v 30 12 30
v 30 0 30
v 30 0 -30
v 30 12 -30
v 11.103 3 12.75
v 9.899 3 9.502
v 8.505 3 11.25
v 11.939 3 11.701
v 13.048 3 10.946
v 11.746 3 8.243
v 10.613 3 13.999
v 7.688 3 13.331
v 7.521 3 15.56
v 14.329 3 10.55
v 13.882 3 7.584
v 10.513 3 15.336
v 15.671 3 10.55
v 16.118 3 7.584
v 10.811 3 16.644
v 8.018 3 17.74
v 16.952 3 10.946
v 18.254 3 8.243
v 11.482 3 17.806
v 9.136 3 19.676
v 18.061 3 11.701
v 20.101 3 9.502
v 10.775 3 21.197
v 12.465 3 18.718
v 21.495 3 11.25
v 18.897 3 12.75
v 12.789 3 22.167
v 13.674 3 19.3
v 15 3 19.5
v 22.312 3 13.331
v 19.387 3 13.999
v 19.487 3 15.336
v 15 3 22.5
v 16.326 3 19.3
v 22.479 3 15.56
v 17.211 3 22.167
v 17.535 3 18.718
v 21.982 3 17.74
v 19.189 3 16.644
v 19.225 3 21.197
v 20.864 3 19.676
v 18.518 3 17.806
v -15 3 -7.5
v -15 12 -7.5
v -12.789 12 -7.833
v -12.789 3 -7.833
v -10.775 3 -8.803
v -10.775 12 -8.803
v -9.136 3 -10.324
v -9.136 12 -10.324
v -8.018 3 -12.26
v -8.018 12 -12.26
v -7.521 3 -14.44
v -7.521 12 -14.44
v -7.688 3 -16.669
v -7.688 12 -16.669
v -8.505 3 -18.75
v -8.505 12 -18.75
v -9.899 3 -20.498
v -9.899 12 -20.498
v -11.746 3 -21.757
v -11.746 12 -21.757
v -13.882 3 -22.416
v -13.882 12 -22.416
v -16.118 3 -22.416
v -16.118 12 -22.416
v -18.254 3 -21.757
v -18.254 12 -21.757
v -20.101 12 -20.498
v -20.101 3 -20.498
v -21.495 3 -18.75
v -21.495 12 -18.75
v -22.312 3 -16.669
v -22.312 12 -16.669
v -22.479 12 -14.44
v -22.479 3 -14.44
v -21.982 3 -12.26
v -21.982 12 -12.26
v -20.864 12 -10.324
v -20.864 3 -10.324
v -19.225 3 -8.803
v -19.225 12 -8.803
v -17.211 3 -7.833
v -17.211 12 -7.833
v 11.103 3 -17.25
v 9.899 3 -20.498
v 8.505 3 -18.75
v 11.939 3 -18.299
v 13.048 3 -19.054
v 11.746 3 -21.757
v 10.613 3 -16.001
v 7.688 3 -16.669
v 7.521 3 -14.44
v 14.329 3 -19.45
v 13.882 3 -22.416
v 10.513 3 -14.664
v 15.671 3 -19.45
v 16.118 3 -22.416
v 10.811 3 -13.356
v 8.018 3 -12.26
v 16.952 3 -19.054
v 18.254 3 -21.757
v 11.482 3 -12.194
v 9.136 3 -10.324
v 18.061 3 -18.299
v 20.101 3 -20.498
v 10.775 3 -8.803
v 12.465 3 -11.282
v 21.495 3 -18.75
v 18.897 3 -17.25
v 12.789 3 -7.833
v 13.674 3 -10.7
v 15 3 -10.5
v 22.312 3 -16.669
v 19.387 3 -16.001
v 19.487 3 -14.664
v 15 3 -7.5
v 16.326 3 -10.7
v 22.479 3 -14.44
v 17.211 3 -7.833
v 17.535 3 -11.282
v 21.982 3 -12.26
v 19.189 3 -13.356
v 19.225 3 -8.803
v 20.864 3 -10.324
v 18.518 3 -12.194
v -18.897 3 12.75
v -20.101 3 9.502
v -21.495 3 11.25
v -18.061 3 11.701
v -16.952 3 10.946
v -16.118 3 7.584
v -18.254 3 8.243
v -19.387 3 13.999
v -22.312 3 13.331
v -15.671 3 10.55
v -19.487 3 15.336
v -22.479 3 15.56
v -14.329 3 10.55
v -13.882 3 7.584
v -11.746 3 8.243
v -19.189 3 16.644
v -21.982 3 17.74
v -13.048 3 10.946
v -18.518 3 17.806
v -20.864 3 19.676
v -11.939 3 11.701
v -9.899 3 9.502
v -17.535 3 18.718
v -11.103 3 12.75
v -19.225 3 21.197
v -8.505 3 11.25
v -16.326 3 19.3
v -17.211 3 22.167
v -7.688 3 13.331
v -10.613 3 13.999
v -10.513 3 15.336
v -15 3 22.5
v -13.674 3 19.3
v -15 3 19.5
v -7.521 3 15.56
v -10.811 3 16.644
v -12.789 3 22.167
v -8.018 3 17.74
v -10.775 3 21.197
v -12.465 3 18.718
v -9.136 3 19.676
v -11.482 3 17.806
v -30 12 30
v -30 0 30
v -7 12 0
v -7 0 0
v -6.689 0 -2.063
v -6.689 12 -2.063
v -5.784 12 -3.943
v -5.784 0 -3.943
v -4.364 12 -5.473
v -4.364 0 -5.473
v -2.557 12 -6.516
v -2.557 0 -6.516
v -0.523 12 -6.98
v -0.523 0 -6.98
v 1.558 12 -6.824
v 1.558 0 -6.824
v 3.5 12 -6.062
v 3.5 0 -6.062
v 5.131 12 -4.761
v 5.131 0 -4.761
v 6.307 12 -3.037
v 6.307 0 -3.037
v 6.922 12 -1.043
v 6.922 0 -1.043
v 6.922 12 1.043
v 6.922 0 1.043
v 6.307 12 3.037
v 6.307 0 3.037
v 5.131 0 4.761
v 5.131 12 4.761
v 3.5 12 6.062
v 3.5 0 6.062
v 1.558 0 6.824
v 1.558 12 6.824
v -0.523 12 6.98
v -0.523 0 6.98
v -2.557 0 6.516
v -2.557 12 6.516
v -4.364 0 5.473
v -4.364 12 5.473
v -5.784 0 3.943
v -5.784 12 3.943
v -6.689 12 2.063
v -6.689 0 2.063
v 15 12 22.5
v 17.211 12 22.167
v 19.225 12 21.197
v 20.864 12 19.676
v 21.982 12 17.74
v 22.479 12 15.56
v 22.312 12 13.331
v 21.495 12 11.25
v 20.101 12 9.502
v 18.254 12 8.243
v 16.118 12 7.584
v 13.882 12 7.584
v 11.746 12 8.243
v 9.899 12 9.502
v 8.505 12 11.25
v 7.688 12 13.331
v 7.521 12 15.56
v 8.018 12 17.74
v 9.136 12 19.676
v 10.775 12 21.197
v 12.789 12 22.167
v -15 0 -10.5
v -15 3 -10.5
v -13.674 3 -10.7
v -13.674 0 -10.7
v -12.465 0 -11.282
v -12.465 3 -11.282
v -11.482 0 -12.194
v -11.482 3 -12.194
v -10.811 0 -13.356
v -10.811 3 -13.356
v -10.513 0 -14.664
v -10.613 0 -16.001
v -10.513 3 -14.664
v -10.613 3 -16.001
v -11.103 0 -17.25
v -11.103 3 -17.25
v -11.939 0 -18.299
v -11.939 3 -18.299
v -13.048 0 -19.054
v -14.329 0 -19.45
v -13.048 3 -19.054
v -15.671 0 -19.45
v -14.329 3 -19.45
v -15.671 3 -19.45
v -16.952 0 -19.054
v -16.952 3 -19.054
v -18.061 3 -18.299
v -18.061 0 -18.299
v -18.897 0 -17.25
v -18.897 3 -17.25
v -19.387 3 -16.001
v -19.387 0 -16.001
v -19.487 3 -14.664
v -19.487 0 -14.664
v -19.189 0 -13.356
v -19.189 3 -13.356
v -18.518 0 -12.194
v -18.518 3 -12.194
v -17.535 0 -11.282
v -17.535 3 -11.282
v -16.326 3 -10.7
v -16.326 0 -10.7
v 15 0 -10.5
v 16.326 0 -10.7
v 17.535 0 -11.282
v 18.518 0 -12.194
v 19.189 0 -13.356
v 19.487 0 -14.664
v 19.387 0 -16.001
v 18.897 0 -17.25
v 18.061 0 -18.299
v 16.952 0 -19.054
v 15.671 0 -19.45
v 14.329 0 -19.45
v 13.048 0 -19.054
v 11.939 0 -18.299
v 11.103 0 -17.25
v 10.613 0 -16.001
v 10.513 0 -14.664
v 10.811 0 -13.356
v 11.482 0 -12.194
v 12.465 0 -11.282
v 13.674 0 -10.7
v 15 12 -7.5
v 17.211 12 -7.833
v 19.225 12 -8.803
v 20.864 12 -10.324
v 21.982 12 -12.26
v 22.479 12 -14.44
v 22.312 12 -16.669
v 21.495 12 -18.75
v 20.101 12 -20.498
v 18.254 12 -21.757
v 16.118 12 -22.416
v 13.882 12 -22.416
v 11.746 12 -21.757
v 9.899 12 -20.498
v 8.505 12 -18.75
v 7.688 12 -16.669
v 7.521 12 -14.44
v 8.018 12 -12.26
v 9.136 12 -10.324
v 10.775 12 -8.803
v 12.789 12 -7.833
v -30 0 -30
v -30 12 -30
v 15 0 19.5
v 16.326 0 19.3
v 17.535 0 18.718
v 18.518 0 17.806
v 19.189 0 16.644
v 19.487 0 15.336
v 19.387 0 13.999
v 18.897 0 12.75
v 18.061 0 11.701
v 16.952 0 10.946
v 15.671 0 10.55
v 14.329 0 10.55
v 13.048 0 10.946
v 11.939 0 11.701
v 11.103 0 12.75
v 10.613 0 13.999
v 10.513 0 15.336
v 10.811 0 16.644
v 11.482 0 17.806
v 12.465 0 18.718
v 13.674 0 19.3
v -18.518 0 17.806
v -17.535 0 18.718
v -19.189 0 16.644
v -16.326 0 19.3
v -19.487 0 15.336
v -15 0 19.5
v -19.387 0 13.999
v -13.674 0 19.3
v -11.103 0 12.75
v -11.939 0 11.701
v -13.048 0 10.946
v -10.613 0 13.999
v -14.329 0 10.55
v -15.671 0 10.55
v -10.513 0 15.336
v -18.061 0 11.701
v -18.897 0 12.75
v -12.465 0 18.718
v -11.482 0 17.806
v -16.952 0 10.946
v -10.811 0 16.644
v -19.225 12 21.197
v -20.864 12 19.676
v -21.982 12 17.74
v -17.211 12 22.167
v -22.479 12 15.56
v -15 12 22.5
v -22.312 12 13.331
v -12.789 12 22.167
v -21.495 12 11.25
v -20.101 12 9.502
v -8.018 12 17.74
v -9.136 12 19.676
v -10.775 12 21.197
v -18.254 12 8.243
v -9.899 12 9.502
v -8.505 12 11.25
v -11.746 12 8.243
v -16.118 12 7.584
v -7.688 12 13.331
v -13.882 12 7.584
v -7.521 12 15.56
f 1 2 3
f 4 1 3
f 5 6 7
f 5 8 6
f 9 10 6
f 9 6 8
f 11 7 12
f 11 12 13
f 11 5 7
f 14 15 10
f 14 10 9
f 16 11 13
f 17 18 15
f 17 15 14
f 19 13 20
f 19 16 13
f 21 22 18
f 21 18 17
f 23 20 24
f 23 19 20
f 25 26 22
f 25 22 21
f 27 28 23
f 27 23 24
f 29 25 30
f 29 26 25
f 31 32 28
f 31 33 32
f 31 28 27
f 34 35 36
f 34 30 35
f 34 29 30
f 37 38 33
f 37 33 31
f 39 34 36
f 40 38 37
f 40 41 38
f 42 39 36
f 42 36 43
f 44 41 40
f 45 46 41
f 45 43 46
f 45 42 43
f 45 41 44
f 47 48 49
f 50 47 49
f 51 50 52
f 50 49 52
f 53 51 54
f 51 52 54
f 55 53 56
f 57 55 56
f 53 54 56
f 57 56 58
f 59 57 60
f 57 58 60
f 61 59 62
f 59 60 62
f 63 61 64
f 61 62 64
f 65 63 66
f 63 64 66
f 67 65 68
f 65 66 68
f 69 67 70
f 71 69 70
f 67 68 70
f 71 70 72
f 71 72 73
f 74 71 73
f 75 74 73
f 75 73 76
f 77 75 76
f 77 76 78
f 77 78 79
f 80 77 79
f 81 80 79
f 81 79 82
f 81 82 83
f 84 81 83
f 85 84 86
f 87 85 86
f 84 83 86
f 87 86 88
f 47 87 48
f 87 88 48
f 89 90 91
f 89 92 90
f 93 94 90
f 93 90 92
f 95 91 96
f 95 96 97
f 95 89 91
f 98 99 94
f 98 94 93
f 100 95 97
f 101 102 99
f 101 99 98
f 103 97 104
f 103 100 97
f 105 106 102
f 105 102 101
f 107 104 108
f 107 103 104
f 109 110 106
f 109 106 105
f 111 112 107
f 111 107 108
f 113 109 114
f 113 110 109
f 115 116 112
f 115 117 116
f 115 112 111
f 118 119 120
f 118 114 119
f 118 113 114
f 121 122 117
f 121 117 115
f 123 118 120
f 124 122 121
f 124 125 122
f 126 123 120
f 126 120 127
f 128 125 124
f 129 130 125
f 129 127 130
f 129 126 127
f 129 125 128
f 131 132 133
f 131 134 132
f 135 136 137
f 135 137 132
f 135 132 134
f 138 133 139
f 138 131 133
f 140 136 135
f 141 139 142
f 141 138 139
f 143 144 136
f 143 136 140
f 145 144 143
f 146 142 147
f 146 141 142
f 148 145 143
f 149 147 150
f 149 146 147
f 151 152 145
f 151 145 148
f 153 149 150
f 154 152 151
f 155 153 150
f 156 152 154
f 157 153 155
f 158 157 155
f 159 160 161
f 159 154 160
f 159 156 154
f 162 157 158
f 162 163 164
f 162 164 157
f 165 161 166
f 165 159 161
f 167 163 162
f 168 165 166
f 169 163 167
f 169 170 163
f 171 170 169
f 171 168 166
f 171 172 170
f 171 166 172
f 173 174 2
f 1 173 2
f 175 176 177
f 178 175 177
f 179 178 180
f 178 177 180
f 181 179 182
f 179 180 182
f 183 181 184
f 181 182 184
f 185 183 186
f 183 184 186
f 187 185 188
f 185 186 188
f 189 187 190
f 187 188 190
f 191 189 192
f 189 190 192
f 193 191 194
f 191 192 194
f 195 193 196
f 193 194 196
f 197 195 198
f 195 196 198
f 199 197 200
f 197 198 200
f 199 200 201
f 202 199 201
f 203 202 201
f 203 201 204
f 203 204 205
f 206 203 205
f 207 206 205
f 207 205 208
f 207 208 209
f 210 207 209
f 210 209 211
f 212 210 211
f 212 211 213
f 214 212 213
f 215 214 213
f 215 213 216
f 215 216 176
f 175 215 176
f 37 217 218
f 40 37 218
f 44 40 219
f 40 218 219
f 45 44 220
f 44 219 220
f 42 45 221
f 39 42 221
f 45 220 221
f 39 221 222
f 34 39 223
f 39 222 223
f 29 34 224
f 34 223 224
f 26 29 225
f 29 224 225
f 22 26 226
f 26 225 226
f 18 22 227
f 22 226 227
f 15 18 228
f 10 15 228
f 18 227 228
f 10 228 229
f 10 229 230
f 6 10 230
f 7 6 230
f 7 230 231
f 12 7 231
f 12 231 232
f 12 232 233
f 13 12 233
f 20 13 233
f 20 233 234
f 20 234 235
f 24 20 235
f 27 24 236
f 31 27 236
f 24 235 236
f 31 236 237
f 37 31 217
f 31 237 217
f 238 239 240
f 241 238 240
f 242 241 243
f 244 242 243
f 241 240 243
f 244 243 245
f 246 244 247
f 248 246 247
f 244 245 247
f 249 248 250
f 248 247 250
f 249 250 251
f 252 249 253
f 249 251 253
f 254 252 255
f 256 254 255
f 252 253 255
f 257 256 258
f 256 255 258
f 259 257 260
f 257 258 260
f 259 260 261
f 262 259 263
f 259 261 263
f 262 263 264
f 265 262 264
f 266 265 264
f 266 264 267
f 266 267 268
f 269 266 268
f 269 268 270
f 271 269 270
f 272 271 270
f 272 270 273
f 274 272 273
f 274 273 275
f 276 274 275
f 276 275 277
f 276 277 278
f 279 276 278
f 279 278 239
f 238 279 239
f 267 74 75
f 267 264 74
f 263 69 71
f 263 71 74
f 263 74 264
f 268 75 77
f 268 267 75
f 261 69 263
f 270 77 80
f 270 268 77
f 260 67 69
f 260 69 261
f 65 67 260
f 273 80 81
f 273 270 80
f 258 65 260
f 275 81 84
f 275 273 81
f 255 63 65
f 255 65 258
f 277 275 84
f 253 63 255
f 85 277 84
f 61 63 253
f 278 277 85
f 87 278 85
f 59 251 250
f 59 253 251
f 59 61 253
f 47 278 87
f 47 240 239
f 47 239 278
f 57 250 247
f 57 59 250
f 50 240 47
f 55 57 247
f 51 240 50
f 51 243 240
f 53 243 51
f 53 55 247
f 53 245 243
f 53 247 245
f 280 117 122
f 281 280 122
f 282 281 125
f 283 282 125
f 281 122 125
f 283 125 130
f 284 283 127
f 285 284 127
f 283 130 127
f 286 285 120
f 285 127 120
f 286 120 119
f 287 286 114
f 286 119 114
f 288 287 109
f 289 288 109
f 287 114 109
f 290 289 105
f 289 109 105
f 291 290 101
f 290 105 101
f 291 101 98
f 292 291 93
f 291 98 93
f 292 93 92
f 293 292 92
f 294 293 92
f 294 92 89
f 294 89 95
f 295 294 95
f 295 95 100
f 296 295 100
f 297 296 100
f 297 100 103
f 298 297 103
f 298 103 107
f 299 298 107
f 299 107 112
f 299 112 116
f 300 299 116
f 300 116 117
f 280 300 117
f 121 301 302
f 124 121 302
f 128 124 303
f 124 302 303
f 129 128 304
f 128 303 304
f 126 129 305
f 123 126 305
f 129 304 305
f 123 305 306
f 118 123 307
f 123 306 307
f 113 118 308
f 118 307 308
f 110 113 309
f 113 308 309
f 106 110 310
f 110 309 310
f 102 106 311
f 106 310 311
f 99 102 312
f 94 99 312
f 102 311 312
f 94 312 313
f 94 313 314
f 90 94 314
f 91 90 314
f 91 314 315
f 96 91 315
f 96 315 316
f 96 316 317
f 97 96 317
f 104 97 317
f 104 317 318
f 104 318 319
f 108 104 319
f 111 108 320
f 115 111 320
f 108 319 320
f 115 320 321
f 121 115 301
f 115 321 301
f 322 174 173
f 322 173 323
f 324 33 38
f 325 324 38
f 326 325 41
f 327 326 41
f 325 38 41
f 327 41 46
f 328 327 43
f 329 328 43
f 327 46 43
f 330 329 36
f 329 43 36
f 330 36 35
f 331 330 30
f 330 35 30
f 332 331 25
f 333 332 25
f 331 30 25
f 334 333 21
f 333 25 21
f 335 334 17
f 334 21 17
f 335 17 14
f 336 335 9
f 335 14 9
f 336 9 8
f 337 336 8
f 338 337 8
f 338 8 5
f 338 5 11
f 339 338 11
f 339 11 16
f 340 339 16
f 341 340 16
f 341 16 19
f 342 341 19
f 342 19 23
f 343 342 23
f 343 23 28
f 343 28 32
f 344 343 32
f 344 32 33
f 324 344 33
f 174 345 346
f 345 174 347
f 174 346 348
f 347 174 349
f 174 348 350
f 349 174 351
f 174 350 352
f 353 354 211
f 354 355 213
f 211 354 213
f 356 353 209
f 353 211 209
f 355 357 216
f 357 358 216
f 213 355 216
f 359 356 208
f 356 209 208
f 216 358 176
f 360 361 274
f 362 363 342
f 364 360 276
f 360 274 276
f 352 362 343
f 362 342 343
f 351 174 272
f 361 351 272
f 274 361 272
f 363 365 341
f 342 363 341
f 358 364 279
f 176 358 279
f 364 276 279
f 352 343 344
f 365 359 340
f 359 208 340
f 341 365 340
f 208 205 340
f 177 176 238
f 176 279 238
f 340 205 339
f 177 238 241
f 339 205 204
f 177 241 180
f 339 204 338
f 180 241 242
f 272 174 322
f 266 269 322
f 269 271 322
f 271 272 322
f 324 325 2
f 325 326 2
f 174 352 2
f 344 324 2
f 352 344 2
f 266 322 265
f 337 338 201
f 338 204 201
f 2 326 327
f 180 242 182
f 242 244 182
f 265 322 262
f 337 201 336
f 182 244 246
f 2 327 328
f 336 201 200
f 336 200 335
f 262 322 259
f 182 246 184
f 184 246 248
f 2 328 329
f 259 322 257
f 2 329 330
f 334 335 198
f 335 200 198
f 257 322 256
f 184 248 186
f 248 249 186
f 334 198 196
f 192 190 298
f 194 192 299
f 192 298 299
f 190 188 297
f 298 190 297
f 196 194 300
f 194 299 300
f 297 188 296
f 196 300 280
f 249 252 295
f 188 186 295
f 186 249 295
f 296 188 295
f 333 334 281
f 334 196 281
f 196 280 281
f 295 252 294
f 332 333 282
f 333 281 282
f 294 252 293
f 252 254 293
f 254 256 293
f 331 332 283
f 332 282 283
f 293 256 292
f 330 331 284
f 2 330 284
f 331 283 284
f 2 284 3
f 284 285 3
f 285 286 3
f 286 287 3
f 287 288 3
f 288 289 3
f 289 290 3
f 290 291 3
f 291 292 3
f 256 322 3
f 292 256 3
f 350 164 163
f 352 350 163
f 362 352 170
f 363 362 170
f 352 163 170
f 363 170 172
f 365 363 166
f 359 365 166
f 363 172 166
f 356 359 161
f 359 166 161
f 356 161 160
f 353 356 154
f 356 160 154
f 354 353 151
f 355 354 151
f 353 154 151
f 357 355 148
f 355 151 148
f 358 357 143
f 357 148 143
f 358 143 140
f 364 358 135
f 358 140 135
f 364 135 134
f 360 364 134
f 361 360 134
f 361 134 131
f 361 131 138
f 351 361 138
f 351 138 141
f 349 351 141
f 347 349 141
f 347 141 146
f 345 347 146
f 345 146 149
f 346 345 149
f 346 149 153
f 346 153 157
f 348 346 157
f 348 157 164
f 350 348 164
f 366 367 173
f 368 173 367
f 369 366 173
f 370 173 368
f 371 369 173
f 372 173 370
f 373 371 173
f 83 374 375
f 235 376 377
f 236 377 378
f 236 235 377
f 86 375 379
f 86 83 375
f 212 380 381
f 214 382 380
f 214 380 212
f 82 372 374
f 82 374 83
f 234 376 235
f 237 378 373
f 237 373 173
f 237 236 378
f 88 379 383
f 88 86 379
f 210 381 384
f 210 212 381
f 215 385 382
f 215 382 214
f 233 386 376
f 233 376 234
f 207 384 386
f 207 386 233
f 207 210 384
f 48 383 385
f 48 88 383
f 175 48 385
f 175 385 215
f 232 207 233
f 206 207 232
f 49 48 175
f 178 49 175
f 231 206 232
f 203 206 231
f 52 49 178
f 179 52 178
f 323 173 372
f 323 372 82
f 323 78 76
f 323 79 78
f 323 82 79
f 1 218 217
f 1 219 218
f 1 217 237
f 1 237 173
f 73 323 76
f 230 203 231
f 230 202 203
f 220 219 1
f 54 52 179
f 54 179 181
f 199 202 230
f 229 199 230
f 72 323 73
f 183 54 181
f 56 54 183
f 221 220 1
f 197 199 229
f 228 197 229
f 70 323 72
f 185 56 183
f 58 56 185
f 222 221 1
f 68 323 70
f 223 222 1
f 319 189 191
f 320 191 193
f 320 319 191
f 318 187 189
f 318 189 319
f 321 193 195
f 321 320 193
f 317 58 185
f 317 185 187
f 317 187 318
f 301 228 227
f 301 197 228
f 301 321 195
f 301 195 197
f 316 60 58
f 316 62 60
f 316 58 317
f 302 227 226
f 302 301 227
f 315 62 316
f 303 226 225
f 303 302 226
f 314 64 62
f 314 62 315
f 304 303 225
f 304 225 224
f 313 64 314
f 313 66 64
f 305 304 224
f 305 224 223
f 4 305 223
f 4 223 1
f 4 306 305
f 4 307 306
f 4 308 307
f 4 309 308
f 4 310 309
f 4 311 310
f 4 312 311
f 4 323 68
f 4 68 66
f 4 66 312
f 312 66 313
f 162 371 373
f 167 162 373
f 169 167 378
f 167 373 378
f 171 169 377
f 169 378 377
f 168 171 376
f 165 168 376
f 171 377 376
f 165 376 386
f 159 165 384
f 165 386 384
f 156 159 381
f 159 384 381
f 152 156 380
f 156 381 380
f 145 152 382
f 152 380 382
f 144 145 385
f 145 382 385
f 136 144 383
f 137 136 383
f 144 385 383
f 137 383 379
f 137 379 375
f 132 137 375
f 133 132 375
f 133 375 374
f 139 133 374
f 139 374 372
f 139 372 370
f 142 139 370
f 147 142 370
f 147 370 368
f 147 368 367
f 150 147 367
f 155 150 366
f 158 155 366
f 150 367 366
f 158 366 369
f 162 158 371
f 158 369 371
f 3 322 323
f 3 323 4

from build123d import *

# Parameters (mm, degrees)
SKETCH_1_W             = 60
SKETCH_1_H             = 60
EXTRUDE_1_DEPTH        = 12
HOLE_WIZARD_M161_D     = 14
HOLE_WIZARD_M161_DEPTH = 12
SKETCH_12_R            = 4.5
CUT_EXTRUDE_1_DEPTH    = 13
SKETCH_13_R            = 7.5
CUT_EXTRUDE_2_DEPTH    = 9


with BuildPart() as part:
    # Эскиз1 → Бобышка-Вытянуть1 (new body)
    with BuildSketch(Plane(origin=(0, 0, 0), x_dir=(1, 0, 0), z_dir=(0, 1, 0))):
        Rectangle(SKETCH_1_W, SKETCH_1_H)
    extrude(amount=EXTRUDE_1_DEPTH)

    # Отверстие обработанное метчиком M161
    with Locations(Plane(origin=(0, 12, 0), x_dir=(1, 0, 0), z_dir=(0, 1, 0))):
        with Locations((0, 0)):
            Hole(HOLE_WIZARD_M161_D / 2, depth=HOLE_WIZARD_M161_DEPTH)

    # Эскиз12 → Вырез-Вытянуть1 (cut, through all)
    with BuildSketch(Plane(origin=(0, 12, 0), x_dir=(1, 0, 0), z_dir=(0, 1, 0))):
        with Locations(Location((-15, 15, 0), (0, 0, 270))):  # turned: the seam where the file's is
            Circle(SKETCH_12_R)
        with Locations(Location((15, 15, 0), (0, 0, 270))):  # turned: the seam where the file's is
            Circle(SKETCH_12_R)
        with Locations(Location((15, -15, 0), (0, 0, 270))):  # turned: the seam where the file's is
            Circle(SKETCH_12_R)
        with Locations(Location((-15, -15, 0), (0, 0, 270))):  # turned: the seam where the file's is
            Circle(SKETCH_12_R)
    extrude(amount=-CUT_EXTRUDE_1_DEPTH, mode=Mode.SUBTRACT)

    # Эскиз13 → Вырез-Вытянуть2 (cut)
    with BuildSketch(Plane(origin=(0, 12, 0), x_dir=(1, 0, 0), z_dir=(0, 1, 0))):
        with Locations(Location((-15, 15, 0), (0, 0, 270))):  # turned: the seam where the file's is
            Circle(SKETCH_13_R)
        with Locations(Location((15, 15, 0), (0, 0, 270))):  # turned: the seam where the file's is
            Circle(SKETCH_13_R)
        with Locations(Location((15, -15, 0), (0, 0, 270))):  # turned: the seam where the file's is
            Circle(SKETCH_13_R)
        with Locations(Location((-15, -15, 0), (0, 0, 270))):  # turned: the seam where the file's is
            Circle(SKETCH_13_R)
    extrude(amount=-CUT_EXTRUDE_2_DEPTH, mode=Mode.SUBTRACT)


solid = part.part
